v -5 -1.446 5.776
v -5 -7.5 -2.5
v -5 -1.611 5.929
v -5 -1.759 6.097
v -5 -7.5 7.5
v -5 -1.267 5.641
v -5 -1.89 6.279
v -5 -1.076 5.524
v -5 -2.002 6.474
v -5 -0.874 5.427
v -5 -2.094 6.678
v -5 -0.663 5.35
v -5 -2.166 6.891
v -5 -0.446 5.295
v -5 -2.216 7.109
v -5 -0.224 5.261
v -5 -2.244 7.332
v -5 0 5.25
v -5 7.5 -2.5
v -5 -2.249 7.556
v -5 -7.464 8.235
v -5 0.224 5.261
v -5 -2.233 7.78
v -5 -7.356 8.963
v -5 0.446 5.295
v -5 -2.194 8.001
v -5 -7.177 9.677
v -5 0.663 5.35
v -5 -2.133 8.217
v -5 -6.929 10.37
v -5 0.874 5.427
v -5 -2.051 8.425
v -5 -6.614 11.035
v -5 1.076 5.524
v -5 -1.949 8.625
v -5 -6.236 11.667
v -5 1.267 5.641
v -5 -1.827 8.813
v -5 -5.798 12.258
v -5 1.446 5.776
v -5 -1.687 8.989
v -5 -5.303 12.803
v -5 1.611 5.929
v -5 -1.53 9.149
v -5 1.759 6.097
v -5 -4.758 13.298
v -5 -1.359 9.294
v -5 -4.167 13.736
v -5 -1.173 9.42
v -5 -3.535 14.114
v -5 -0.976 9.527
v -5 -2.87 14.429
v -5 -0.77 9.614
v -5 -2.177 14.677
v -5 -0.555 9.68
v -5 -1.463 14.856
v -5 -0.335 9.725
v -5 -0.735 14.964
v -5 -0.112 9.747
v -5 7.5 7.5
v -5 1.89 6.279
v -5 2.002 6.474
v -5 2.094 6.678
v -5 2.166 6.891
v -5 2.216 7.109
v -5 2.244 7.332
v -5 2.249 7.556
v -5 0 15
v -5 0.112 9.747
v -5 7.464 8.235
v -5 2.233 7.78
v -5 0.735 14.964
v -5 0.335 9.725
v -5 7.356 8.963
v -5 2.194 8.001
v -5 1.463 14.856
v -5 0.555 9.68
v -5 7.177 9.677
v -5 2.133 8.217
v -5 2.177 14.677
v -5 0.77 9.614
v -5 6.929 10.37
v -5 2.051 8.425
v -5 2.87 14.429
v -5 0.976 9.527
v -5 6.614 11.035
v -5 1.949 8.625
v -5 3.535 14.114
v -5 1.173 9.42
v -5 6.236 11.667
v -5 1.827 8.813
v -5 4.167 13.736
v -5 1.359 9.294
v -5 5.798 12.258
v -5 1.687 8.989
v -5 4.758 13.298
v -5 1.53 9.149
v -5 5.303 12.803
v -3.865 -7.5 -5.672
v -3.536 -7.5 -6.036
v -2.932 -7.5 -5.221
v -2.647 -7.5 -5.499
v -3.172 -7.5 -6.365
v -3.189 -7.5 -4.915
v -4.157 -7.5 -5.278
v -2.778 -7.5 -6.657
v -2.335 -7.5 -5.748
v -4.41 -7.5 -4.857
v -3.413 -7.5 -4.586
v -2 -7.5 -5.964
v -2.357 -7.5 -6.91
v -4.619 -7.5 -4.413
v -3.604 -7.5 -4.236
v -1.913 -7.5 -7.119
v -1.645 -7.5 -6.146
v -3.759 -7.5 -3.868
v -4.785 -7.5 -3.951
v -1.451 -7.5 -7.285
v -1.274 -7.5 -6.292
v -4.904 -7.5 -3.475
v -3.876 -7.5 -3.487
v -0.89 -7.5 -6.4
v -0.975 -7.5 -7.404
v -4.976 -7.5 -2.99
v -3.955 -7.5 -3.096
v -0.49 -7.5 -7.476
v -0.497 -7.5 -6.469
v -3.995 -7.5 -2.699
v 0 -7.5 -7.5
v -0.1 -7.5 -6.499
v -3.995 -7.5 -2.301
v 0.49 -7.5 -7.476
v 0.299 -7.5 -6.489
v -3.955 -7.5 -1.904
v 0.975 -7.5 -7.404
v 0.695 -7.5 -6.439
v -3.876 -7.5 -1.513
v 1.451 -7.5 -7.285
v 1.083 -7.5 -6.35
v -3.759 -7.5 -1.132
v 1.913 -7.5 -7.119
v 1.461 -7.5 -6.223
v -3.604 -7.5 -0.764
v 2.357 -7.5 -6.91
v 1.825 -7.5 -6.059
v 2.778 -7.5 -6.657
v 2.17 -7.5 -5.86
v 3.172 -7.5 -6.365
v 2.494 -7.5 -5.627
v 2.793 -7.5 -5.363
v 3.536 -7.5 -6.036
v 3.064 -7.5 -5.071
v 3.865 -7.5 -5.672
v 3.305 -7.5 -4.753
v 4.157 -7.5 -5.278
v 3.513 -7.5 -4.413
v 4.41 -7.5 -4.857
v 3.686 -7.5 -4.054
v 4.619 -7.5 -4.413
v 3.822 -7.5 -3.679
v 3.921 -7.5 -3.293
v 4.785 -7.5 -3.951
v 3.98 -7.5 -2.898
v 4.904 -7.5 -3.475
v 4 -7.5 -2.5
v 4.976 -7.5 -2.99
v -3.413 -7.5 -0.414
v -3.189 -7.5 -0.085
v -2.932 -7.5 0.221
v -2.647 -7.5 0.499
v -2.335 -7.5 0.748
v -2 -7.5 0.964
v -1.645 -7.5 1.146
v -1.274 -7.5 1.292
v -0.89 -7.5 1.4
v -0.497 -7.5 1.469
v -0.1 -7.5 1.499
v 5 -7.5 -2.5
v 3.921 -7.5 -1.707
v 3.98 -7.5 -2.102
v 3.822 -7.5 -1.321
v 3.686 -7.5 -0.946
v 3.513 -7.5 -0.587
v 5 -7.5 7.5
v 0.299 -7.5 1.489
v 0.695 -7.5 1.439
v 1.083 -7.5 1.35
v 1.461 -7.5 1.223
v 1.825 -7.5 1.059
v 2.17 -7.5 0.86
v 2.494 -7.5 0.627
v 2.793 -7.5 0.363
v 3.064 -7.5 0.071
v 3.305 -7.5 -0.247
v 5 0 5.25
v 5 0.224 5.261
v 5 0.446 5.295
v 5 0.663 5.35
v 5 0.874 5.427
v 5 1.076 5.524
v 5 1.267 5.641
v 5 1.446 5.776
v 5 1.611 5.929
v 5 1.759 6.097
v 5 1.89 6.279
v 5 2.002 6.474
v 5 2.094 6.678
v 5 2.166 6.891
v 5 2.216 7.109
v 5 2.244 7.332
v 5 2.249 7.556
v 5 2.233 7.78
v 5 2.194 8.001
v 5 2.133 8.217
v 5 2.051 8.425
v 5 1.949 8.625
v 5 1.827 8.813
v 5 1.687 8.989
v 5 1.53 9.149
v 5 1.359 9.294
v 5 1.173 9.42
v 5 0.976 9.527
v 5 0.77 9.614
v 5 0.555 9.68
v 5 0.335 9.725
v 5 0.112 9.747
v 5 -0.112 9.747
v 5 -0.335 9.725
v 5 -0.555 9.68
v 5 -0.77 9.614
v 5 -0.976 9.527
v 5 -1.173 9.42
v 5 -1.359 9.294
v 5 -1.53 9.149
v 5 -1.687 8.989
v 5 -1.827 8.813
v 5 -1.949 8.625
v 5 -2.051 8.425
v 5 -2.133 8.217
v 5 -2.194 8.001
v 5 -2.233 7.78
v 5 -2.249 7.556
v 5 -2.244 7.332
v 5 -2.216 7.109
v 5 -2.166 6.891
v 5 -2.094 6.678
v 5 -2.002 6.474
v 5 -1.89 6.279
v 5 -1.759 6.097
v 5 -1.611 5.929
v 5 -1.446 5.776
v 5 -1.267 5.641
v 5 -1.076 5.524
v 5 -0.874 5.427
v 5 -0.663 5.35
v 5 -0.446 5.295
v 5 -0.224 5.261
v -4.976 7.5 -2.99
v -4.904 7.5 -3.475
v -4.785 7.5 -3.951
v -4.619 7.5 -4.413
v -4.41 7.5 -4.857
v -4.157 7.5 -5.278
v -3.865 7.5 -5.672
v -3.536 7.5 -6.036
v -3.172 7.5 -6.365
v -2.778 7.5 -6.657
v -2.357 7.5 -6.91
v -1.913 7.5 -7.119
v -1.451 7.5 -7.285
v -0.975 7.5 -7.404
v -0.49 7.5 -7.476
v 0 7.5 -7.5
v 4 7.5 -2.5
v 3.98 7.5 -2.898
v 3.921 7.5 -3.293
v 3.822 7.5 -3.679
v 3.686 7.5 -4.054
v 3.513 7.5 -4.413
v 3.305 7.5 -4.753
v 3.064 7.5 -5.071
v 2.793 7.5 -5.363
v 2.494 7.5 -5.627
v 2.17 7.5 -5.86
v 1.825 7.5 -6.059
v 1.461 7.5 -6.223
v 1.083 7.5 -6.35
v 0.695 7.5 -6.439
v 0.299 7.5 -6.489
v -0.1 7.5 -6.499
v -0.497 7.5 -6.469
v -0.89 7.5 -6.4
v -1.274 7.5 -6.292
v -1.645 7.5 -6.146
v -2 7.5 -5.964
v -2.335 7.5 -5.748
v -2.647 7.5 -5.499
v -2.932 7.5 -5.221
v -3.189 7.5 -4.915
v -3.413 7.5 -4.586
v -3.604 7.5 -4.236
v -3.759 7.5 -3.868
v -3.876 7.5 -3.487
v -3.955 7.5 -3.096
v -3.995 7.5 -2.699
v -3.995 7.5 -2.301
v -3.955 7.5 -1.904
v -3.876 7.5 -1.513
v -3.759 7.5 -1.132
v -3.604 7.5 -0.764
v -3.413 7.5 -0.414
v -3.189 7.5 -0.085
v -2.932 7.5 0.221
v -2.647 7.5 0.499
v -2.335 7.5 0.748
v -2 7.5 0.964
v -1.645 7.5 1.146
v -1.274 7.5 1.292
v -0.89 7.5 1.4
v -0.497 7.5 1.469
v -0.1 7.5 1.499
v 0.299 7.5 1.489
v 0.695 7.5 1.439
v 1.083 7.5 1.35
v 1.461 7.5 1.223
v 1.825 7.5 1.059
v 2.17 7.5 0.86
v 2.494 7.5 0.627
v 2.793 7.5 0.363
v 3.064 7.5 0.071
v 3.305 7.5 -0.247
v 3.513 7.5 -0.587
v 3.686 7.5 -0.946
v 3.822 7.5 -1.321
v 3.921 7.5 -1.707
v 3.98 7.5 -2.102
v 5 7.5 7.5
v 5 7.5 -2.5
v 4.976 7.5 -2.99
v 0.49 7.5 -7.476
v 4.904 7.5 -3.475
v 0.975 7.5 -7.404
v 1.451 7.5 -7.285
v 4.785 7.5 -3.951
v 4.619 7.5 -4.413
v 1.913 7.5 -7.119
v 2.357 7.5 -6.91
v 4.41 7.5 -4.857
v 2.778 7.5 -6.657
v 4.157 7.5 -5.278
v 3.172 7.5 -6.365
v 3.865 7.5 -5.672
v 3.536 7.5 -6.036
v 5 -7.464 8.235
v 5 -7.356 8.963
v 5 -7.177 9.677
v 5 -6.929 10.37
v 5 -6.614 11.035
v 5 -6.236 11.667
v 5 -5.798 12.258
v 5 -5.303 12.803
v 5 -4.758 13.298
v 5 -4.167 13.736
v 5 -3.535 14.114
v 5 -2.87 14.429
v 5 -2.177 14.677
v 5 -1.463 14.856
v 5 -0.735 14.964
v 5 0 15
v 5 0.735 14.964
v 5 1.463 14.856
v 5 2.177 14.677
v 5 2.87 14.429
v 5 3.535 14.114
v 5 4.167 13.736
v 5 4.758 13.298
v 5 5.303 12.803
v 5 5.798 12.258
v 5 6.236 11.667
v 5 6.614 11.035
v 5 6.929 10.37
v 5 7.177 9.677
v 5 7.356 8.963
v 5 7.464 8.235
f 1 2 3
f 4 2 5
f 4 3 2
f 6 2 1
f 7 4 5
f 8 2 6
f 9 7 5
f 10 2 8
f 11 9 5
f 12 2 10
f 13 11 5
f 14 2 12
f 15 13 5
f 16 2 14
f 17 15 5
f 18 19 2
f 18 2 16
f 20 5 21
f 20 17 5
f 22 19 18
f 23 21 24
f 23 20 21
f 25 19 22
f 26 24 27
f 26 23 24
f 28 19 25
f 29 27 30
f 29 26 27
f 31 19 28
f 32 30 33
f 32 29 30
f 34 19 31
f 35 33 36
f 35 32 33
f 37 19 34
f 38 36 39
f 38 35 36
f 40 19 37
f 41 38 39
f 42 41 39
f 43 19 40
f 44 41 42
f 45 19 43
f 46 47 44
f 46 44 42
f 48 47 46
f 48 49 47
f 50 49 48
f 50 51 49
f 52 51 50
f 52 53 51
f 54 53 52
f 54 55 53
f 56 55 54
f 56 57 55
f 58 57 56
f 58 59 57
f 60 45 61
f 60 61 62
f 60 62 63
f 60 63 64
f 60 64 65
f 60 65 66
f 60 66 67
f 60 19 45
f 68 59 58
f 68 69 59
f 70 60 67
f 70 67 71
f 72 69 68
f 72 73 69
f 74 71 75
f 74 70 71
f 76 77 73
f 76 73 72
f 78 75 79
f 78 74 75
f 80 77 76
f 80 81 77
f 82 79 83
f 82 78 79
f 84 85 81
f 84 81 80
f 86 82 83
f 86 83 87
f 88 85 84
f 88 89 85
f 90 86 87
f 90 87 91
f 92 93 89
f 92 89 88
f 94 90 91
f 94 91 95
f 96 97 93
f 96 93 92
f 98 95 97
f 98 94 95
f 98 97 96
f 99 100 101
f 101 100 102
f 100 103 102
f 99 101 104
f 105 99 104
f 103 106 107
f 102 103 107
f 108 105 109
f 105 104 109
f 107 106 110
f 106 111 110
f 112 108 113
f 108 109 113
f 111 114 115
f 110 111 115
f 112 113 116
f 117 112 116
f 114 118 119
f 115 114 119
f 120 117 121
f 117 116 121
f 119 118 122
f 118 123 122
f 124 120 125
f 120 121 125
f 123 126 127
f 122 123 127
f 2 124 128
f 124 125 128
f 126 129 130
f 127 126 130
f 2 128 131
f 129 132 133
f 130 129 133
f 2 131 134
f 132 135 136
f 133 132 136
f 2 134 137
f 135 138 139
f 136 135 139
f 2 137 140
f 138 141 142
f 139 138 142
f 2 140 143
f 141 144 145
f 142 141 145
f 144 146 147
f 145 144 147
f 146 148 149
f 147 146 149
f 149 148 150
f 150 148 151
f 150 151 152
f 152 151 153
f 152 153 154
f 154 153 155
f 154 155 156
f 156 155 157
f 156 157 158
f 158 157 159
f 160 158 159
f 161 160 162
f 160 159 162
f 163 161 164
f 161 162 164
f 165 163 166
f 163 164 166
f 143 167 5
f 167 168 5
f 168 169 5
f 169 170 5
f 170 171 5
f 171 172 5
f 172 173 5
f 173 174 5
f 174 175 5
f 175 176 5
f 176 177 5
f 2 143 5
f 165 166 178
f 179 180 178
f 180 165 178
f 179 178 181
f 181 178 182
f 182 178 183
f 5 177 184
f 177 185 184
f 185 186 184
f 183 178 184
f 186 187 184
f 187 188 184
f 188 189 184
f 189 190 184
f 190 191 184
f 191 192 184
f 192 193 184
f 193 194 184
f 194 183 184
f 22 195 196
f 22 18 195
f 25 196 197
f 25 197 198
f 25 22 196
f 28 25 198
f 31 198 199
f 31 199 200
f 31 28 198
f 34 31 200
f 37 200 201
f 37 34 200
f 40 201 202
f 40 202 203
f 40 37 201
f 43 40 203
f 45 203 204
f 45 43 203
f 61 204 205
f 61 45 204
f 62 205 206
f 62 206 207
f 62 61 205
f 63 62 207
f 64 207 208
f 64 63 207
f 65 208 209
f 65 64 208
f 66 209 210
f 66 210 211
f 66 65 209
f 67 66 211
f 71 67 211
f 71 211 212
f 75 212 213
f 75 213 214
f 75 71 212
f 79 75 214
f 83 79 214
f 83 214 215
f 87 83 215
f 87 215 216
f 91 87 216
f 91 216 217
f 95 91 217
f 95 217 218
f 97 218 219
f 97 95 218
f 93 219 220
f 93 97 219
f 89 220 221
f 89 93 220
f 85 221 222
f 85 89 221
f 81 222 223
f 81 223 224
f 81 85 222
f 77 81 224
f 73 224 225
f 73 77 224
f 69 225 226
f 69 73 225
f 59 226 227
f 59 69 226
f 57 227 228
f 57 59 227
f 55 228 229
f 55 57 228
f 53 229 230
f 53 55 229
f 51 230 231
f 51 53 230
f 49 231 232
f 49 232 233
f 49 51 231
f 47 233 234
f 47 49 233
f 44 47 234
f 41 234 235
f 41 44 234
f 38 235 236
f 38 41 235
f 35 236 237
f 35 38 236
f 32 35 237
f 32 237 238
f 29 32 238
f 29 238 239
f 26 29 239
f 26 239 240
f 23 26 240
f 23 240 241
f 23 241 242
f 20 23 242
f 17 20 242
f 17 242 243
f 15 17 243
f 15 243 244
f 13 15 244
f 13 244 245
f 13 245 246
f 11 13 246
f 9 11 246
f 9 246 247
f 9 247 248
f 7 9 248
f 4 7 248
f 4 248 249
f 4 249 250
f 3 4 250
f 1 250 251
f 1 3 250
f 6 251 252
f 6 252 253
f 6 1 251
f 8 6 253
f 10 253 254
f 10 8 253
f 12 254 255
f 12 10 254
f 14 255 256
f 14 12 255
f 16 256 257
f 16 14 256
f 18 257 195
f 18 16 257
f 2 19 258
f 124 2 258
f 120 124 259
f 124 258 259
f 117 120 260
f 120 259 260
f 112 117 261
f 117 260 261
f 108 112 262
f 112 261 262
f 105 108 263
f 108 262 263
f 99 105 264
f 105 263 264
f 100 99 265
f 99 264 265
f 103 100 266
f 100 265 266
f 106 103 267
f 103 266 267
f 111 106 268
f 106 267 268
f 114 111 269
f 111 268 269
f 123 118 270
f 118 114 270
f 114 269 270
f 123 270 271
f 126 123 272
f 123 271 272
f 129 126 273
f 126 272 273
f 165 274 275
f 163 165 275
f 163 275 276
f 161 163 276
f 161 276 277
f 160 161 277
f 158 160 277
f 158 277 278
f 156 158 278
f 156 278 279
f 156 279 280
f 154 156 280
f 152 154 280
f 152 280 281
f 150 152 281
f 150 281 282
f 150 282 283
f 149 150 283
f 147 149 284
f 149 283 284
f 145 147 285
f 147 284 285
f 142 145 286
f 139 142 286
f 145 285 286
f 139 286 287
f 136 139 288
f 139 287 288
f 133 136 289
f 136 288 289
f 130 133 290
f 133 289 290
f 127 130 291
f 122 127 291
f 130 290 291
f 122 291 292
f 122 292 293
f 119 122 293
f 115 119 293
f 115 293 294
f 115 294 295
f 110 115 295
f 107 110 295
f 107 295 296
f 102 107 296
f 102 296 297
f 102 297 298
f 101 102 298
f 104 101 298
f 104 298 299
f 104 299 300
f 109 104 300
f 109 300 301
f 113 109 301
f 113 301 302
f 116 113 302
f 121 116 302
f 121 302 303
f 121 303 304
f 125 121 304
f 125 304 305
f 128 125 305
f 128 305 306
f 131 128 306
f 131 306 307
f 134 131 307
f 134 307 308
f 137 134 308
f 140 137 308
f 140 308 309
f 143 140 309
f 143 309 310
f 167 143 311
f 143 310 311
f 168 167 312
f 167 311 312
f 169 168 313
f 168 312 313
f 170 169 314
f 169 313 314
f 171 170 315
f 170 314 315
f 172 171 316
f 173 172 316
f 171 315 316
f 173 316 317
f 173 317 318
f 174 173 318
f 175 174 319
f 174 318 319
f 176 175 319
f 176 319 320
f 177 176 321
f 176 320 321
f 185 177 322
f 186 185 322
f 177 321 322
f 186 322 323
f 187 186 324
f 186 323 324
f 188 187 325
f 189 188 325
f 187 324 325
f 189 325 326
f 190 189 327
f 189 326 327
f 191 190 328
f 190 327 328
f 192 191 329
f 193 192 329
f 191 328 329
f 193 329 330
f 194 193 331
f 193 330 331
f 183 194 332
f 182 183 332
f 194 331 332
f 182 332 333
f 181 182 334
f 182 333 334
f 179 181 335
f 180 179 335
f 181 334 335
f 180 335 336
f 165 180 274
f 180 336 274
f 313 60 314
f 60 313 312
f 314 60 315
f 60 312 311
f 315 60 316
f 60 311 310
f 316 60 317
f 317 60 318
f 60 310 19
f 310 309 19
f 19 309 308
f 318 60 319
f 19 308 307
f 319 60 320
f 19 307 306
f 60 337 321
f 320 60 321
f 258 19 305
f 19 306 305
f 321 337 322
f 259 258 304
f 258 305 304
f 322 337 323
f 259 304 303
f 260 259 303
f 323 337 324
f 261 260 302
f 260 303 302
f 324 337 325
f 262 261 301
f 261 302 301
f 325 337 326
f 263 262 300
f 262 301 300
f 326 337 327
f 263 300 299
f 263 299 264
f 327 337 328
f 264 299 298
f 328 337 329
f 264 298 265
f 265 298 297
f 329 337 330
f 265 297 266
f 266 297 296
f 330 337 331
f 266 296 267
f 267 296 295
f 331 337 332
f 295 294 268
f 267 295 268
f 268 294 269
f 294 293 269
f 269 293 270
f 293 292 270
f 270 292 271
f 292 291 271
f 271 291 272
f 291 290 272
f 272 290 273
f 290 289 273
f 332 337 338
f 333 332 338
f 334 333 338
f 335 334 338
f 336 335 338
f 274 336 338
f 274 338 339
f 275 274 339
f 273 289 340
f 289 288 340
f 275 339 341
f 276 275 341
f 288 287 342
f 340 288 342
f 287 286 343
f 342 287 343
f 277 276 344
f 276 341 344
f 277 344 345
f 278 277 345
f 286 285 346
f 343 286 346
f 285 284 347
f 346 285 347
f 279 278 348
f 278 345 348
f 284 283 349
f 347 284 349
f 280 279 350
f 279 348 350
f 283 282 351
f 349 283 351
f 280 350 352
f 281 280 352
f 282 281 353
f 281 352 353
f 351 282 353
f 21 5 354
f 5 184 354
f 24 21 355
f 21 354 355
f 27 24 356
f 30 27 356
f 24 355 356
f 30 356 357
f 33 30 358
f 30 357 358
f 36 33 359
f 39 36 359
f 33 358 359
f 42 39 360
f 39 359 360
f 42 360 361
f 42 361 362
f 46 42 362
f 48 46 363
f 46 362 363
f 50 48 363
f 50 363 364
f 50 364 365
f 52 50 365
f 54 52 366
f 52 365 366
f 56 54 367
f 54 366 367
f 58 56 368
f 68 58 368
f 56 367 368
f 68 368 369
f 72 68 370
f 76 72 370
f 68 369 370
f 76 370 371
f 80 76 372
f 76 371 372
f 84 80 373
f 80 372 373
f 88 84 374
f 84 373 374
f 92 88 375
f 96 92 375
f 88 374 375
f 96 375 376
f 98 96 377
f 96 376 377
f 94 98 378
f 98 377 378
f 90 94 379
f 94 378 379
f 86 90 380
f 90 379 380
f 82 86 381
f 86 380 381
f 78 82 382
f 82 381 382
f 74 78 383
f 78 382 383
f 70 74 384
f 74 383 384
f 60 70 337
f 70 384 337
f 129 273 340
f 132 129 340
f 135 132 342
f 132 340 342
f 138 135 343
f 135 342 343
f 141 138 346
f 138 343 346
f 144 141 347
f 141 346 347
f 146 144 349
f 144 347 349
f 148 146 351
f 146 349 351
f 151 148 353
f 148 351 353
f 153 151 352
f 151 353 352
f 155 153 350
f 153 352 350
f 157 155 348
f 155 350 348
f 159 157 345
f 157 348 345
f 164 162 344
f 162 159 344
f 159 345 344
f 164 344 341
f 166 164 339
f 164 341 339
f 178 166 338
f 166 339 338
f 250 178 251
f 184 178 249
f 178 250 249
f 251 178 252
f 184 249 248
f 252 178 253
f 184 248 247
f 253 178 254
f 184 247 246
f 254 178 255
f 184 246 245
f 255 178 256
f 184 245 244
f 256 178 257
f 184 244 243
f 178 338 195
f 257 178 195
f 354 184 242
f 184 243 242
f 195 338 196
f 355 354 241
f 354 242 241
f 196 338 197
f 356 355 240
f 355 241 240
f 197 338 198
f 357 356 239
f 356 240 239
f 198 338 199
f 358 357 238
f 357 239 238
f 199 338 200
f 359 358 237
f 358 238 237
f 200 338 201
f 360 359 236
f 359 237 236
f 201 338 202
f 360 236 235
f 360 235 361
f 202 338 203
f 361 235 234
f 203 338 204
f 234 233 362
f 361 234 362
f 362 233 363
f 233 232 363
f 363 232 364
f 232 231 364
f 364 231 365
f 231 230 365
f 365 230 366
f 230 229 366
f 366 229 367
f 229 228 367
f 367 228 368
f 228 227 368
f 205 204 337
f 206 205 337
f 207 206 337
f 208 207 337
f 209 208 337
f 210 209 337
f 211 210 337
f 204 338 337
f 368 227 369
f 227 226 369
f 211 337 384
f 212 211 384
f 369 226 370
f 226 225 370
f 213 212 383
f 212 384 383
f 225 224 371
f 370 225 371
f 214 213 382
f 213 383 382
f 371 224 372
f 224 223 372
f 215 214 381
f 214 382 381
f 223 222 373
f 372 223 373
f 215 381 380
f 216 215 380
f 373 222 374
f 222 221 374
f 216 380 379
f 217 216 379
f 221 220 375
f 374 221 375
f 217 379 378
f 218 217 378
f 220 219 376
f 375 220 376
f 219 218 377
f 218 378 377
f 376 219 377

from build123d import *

# Parameters (mm, degrees)
SKETCH1_R               = 2.25
BOSS_EXTRUDE1_DEPTH     = 5
SKETCH2_R               = 4
CUT_EXTRUDE1_DEPTH      = 1
CUT_EXTRUDE1_DEPTH_BACK = 16


with BuildPart() as part:
    # Sketch1 → Boss-Extrude1 (new body, symmetric)
    with BuildSketch(Plane(origin=(0, 0, 0), x_dir=(0, 0, -1), z_dir=(1, 0, 0))):
        with BuildLine():
            Line((7.5, -7.5), (-7.5, -7.5))
            ThreePointArc((-7.5, -7.5), (-15, 0), (-7.5, 7.5))
            Line((-7.5, 7.5), (7.5, 7.5))
            Line((7.5, 7.5), (7.5, -7.5))
        make_face()
        with Locations((-7.5, 0)):
            Circle(SKETCH1_R, mode=Mode.SUBTRACT)
    extrude(amount=BOSS_EXTRUDE1_DEPTH, both=True)

    # Sketch2 → Cut-Extrude1 (cut, two sides)
    with BuildSketch(Plane(origin=(0, 7.5, 0), x_dir=(1, 0, 0), z_dir=(0, 1, 0))) as cut_extrude1_sk:
        Polygon((-5, 10.919306059), (-5, 7.5), (0, 7.5), (5, 7.5), (5, 10.919306059), align=None)
        with BuildLine():
            Line((-5, 7.5), (-5, 2.5))
            ThreePointArc((-5, 2.5), (-3.535533906, 6.035533906), (0, 7.5))
            Line((0, 7.5), (-5, 7.5))
        make_face()
        with BuildLine():
            ThreePointArc((0, 7.5), (3.535533906, 6.035533906), (5, 2.5))
            Line((5, 2.5), (5, 7.5))
            Line((5, 7.5), (0, 7.5))
        make_face()
        with Locations((0, 2.5)):
            Circle(SKETCH2_R)
    extrude(amount=CUT_EXTRUDE1_DEPTH, mode=Mode.SUBTRACT)
    extrude(cut_extrude1_sk.sketch, amount=-CUT_EXTRUDE1_DEPTH_BACK, mode=Mode.SUBTRACT)


solid = part.part
